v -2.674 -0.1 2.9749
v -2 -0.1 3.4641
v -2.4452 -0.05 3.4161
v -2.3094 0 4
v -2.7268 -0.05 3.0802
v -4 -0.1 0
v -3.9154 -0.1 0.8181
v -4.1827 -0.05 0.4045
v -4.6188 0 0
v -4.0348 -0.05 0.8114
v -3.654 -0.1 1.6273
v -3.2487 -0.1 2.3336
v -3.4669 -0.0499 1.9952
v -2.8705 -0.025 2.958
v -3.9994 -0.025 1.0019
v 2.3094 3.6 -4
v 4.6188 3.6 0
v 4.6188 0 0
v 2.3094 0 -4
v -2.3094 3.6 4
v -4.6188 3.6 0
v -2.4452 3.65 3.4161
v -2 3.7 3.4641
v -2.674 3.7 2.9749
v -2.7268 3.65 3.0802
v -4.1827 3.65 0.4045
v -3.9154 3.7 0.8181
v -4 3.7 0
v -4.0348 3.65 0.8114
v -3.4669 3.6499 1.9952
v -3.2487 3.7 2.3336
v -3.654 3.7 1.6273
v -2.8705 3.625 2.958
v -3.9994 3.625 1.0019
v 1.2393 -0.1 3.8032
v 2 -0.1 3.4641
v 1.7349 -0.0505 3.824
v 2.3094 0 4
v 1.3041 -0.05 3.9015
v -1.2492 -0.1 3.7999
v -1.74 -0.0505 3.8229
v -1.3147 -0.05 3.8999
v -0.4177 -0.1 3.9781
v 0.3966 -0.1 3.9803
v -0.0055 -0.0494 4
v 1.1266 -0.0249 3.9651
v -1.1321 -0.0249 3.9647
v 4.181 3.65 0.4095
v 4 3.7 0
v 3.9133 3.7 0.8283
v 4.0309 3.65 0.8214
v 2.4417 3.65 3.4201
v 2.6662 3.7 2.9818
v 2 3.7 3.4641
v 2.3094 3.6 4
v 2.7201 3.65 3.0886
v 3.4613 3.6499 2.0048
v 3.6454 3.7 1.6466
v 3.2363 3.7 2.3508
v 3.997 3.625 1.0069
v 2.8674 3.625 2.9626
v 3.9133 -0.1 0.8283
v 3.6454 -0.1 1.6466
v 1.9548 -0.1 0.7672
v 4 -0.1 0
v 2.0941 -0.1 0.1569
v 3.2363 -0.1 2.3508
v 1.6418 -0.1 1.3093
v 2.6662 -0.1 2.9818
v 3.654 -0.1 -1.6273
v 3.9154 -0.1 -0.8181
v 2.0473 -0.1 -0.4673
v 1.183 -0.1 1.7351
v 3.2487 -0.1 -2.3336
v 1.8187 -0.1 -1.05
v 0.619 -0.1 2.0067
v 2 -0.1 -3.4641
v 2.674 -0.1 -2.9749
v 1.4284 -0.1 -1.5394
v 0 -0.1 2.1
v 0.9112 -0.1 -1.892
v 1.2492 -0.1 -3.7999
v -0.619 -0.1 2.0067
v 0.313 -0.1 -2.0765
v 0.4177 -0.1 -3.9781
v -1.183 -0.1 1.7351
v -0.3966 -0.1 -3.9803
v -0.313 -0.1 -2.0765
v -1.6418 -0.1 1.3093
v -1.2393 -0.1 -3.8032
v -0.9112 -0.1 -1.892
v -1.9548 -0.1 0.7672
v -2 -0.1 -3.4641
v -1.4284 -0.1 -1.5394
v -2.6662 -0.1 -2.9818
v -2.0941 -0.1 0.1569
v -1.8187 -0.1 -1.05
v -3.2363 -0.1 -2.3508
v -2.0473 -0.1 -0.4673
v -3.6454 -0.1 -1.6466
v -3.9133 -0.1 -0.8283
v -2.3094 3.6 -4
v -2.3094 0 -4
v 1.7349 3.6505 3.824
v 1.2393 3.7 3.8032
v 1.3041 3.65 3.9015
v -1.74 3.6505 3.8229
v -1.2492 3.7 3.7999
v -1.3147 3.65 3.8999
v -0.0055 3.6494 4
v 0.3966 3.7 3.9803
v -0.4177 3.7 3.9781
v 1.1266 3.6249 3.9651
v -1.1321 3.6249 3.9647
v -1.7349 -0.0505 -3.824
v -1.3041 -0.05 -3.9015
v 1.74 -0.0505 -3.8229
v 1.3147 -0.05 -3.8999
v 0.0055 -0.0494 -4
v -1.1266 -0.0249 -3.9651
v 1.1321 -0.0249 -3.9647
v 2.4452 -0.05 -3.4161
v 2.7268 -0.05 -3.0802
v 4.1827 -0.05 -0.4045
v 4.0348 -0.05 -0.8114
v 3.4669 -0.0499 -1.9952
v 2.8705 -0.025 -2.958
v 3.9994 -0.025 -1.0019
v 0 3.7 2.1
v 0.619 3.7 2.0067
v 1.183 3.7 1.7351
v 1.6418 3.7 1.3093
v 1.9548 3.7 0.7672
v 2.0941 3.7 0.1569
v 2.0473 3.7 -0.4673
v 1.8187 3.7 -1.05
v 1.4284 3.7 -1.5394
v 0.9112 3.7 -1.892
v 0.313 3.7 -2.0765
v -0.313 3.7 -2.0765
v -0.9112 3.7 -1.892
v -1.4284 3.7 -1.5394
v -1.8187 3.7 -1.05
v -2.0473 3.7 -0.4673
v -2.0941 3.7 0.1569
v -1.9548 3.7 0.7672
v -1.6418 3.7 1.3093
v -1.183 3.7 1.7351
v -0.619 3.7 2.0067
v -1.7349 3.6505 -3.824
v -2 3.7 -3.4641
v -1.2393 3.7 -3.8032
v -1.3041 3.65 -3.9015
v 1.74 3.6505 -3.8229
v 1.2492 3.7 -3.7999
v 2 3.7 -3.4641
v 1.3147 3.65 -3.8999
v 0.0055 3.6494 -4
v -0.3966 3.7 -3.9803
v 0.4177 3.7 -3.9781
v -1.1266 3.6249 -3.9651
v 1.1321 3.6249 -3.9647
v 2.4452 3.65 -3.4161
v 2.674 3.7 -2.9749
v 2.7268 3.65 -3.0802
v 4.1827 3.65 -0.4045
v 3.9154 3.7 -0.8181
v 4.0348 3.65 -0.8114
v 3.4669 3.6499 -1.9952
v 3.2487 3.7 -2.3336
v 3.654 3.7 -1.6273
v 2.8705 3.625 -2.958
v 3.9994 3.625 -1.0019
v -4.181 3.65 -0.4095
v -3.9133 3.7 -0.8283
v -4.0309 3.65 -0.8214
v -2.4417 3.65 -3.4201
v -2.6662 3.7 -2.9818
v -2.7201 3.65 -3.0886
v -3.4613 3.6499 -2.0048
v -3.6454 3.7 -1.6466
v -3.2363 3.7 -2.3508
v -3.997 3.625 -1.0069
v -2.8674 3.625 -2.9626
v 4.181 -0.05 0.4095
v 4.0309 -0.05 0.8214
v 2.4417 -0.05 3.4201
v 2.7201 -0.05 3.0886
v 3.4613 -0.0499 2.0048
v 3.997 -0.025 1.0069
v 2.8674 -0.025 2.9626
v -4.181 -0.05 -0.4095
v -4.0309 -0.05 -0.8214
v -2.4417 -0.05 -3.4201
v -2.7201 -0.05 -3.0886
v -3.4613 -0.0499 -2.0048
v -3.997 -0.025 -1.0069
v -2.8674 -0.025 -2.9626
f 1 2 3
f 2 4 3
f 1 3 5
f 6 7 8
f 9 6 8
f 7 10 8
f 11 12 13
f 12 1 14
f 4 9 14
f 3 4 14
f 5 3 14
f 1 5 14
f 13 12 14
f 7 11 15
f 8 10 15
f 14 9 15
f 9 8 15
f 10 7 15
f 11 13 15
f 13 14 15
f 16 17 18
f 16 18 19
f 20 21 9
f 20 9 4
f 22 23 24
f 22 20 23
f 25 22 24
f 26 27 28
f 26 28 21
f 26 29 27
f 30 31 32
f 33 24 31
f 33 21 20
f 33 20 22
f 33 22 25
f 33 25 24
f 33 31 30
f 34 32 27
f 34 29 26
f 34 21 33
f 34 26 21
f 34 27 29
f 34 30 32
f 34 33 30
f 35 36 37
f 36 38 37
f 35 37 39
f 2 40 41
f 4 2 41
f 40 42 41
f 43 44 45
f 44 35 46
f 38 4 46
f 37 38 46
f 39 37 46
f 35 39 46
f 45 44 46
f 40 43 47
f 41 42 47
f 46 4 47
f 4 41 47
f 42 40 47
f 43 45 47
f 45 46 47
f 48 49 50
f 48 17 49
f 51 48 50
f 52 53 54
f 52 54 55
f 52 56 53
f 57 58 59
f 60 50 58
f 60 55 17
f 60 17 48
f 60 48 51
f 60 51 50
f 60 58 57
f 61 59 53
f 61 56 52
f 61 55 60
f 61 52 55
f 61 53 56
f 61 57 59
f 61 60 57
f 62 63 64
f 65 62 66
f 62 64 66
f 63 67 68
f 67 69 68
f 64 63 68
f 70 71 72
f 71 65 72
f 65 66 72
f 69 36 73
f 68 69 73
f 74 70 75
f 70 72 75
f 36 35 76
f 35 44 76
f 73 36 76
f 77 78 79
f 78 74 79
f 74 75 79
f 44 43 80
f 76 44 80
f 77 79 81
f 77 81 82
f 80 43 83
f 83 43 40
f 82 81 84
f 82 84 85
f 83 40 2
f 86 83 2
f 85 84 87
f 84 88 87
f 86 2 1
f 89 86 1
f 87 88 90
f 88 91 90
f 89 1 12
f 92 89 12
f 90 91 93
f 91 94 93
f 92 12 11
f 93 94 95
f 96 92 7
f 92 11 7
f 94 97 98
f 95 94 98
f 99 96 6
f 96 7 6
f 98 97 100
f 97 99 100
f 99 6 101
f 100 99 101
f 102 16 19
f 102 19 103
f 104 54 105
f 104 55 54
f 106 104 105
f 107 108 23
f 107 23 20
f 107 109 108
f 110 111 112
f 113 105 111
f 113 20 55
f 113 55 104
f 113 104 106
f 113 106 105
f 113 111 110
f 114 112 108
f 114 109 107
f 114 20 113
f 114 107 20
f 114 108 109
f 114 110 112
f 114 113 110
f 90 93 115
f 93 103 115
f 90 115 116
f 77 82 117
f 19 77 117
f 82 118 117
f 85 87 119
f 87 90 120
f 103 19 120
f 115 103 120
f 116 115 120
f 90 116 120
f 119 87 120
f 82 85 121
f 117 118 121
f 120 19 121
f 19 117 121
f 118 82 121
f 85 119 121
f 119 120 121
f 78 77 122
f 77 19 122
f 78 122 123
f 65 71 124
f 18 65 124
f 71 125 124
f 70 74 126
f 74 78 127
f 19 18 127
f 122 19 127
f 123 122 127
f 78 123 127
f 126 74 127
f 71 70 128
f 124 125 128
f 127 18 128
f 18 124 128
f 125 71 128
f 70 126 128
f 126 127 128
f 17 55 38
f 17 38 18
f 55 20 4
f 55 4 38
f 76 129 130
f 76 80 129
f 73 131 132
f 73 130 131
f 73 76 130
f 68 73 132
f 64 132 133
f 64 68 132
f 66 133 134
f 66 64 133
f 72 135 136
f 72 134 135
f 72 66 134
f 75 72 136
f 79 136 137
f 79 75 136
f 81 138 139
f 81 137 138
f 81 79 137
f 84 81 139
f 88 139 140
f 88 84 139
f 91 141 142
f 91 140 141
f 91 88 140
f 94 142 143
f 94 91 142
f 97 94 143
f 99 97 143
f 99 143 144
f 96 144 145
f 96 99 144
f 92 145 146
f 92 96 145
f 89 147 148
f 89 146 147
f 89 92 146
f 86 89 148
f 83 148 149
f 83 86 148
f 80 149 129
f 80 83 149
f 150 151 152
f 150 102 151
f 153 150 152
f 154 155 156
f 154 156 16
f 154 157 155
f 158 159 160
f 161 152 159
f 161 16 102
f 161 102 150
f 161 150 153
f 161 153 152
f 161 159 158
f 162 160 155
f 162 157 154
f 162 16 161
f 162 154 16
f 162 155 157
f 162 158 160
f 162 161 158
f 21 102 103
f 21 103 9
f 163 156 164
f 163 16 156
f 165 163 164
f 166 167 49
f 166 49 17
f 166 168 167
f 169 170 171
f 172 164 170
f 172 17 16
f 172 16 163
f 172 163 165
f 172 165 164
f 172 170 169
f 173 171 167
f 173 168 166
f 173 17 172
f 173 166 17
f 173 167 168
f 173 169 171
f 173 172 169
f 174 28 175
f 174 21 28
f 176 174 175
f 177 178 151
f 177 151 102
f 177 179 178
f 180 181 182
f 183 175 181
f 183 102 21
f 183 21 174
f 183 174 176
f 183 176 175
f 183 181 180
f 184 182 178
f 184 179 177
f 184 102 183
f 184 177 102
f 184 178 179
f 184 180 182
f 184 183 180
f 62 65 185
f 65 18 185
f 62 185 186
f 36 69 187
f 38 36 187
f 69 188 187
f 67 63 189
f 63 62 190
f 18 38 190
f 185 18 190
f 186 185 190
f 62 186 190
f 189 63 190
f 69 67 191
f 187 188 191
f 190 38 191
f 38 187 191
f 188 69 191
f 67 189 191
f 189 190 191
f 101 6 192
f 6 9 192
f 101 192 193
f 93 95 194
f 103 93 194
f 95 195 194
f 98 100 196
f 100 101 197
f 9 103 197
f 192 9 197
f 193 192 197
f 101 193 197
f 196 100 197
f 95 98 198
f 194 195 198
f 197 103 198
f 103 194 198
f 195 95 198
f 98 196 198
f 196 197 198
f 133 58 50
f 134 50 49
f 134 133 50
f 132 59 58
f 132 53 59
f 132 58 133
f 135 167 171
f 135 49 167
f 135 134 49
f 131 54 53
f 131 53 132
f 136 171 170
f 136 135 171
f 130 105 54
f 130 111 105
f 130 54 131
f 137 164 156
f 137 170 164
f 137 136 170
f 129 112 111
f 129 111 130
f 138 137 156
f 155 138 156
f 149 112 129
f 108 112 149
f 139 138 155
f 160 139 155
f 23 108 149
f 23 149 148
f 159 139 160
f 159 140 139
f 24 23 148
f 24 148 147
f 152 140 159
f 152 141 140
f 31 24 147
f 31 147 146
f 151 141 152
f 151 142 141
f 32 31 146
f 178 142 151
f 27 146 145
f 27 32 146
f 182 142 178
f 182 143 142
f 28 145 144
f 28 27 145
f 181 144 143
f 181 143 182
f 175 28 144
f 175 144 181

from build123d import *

# Parameters (mm, degrees)
EXTRUDE_1_DEPTH     = 1.8
SKETCH_5_R          = 2.1
CUT_EXTRUDE_1_DEPTH = 8.195369054
HOLE_WIZARD_M5_1_D  = 4.2


with BuildPart() as part:
    # 草图1 → 凸台-拉伸1 (new body)
    with BuildSketch(Plane(origin=(0, 0, 0), x_dir=(1, 0, 0), z_dir=(0, 1, 0))):
        Polygon((4.618802154, 0), (2.309401077, 4), (-2.309401077, 4), (-4.618802154, 0), (-2.309401077, -4), (2.309401077, -4), align=None)
    extrude_1 = extrude(amount=EXTRUDE_1_DEPTH)

    # 草图4 for 放样1 → 放样1 section 0
    with BuildSketch(Plane(origin=(0, -0.1, 0), x_dir=(-1, 0, 0), z_dir=(0, -1, 0))):
        with BuildLine():
            # circular arc as an exact rational Bezier (weights 1, cos(half-angle), 1)
            Bezier((-4, 0), (-4, -2.309401077), (-2, -3.464101615), weights=[1, 0.866025404, 1])
            Bezier((-2, -3.464101615), (0, -4.618802154), (2, -3.464101615), weights=[1, 0.866025404, 1])
            Bezier((2, -3.464101615), (4, -2.309401077), (4, 0), weights=[1, 0.866025404, 1])
            Bezier((4, 0), (4, 2.309401077), (2, 3.464101615), weights=[1, 0.866025404, 1])
            Bezier((2, 3.464101615), (0, 4.618802154), (-2, 3.464101615), weights=[1, 0.866025404, 1])
            Bezier((-2, 3.464101615), (-4, 2.309401077), (-4, 0), weights=[1, 0.866025404, 1])
        make_face()
    # 草图3 → 放样1 section 1
    with BuildSketch(Plane.XZ):
        with BuildLine():
            Line((4.618802154, 0), (2.309401077, 4))
            Line((2.309401077, 4), (-2.309401077, 4))
            Line((-2.309401077, 4), (-4.618802154, 0))
            Line((-4.618802154, 0), (-2.309401077, -4))
            Line((-2.309401077, -4), (2.309401077, -4))
            Line((2.309401077, -4), (4.618802154, 0))
        make_face()
    loft_1 = loft()

    # 镜向1: 凸台-拉伸1, 放样1 across plane
    add(extrude_1.mirror(Plane.ZX.offset(1.8)))
    add(loft_1.mirror(Plane.ZX.offset(1.8)))

    # 草图5 → 切除-拉伸1 (cut, through all)
    with BuildSketch(Plane(origin=(0, -0.1, 0), x_dir=(1, 0, 0), z_dir=(0, 1, 0))):
        with Locations(Location((0, 0, 0), (0, 0, 270))):
            Circle(SKETCH_5_R)
    extrude(amount=CUT_EXTRUDE_1_DEPTH, mode=Mode.SUBTRACT)

    # M5 螺纹孔1 (through all)
    with Locations(Plane.ZX.offset(3.7)):
        with Locations((0, 0)):
            Hole(HOLE_WIZARD_M5_1_D / 2)


solid = part.part
